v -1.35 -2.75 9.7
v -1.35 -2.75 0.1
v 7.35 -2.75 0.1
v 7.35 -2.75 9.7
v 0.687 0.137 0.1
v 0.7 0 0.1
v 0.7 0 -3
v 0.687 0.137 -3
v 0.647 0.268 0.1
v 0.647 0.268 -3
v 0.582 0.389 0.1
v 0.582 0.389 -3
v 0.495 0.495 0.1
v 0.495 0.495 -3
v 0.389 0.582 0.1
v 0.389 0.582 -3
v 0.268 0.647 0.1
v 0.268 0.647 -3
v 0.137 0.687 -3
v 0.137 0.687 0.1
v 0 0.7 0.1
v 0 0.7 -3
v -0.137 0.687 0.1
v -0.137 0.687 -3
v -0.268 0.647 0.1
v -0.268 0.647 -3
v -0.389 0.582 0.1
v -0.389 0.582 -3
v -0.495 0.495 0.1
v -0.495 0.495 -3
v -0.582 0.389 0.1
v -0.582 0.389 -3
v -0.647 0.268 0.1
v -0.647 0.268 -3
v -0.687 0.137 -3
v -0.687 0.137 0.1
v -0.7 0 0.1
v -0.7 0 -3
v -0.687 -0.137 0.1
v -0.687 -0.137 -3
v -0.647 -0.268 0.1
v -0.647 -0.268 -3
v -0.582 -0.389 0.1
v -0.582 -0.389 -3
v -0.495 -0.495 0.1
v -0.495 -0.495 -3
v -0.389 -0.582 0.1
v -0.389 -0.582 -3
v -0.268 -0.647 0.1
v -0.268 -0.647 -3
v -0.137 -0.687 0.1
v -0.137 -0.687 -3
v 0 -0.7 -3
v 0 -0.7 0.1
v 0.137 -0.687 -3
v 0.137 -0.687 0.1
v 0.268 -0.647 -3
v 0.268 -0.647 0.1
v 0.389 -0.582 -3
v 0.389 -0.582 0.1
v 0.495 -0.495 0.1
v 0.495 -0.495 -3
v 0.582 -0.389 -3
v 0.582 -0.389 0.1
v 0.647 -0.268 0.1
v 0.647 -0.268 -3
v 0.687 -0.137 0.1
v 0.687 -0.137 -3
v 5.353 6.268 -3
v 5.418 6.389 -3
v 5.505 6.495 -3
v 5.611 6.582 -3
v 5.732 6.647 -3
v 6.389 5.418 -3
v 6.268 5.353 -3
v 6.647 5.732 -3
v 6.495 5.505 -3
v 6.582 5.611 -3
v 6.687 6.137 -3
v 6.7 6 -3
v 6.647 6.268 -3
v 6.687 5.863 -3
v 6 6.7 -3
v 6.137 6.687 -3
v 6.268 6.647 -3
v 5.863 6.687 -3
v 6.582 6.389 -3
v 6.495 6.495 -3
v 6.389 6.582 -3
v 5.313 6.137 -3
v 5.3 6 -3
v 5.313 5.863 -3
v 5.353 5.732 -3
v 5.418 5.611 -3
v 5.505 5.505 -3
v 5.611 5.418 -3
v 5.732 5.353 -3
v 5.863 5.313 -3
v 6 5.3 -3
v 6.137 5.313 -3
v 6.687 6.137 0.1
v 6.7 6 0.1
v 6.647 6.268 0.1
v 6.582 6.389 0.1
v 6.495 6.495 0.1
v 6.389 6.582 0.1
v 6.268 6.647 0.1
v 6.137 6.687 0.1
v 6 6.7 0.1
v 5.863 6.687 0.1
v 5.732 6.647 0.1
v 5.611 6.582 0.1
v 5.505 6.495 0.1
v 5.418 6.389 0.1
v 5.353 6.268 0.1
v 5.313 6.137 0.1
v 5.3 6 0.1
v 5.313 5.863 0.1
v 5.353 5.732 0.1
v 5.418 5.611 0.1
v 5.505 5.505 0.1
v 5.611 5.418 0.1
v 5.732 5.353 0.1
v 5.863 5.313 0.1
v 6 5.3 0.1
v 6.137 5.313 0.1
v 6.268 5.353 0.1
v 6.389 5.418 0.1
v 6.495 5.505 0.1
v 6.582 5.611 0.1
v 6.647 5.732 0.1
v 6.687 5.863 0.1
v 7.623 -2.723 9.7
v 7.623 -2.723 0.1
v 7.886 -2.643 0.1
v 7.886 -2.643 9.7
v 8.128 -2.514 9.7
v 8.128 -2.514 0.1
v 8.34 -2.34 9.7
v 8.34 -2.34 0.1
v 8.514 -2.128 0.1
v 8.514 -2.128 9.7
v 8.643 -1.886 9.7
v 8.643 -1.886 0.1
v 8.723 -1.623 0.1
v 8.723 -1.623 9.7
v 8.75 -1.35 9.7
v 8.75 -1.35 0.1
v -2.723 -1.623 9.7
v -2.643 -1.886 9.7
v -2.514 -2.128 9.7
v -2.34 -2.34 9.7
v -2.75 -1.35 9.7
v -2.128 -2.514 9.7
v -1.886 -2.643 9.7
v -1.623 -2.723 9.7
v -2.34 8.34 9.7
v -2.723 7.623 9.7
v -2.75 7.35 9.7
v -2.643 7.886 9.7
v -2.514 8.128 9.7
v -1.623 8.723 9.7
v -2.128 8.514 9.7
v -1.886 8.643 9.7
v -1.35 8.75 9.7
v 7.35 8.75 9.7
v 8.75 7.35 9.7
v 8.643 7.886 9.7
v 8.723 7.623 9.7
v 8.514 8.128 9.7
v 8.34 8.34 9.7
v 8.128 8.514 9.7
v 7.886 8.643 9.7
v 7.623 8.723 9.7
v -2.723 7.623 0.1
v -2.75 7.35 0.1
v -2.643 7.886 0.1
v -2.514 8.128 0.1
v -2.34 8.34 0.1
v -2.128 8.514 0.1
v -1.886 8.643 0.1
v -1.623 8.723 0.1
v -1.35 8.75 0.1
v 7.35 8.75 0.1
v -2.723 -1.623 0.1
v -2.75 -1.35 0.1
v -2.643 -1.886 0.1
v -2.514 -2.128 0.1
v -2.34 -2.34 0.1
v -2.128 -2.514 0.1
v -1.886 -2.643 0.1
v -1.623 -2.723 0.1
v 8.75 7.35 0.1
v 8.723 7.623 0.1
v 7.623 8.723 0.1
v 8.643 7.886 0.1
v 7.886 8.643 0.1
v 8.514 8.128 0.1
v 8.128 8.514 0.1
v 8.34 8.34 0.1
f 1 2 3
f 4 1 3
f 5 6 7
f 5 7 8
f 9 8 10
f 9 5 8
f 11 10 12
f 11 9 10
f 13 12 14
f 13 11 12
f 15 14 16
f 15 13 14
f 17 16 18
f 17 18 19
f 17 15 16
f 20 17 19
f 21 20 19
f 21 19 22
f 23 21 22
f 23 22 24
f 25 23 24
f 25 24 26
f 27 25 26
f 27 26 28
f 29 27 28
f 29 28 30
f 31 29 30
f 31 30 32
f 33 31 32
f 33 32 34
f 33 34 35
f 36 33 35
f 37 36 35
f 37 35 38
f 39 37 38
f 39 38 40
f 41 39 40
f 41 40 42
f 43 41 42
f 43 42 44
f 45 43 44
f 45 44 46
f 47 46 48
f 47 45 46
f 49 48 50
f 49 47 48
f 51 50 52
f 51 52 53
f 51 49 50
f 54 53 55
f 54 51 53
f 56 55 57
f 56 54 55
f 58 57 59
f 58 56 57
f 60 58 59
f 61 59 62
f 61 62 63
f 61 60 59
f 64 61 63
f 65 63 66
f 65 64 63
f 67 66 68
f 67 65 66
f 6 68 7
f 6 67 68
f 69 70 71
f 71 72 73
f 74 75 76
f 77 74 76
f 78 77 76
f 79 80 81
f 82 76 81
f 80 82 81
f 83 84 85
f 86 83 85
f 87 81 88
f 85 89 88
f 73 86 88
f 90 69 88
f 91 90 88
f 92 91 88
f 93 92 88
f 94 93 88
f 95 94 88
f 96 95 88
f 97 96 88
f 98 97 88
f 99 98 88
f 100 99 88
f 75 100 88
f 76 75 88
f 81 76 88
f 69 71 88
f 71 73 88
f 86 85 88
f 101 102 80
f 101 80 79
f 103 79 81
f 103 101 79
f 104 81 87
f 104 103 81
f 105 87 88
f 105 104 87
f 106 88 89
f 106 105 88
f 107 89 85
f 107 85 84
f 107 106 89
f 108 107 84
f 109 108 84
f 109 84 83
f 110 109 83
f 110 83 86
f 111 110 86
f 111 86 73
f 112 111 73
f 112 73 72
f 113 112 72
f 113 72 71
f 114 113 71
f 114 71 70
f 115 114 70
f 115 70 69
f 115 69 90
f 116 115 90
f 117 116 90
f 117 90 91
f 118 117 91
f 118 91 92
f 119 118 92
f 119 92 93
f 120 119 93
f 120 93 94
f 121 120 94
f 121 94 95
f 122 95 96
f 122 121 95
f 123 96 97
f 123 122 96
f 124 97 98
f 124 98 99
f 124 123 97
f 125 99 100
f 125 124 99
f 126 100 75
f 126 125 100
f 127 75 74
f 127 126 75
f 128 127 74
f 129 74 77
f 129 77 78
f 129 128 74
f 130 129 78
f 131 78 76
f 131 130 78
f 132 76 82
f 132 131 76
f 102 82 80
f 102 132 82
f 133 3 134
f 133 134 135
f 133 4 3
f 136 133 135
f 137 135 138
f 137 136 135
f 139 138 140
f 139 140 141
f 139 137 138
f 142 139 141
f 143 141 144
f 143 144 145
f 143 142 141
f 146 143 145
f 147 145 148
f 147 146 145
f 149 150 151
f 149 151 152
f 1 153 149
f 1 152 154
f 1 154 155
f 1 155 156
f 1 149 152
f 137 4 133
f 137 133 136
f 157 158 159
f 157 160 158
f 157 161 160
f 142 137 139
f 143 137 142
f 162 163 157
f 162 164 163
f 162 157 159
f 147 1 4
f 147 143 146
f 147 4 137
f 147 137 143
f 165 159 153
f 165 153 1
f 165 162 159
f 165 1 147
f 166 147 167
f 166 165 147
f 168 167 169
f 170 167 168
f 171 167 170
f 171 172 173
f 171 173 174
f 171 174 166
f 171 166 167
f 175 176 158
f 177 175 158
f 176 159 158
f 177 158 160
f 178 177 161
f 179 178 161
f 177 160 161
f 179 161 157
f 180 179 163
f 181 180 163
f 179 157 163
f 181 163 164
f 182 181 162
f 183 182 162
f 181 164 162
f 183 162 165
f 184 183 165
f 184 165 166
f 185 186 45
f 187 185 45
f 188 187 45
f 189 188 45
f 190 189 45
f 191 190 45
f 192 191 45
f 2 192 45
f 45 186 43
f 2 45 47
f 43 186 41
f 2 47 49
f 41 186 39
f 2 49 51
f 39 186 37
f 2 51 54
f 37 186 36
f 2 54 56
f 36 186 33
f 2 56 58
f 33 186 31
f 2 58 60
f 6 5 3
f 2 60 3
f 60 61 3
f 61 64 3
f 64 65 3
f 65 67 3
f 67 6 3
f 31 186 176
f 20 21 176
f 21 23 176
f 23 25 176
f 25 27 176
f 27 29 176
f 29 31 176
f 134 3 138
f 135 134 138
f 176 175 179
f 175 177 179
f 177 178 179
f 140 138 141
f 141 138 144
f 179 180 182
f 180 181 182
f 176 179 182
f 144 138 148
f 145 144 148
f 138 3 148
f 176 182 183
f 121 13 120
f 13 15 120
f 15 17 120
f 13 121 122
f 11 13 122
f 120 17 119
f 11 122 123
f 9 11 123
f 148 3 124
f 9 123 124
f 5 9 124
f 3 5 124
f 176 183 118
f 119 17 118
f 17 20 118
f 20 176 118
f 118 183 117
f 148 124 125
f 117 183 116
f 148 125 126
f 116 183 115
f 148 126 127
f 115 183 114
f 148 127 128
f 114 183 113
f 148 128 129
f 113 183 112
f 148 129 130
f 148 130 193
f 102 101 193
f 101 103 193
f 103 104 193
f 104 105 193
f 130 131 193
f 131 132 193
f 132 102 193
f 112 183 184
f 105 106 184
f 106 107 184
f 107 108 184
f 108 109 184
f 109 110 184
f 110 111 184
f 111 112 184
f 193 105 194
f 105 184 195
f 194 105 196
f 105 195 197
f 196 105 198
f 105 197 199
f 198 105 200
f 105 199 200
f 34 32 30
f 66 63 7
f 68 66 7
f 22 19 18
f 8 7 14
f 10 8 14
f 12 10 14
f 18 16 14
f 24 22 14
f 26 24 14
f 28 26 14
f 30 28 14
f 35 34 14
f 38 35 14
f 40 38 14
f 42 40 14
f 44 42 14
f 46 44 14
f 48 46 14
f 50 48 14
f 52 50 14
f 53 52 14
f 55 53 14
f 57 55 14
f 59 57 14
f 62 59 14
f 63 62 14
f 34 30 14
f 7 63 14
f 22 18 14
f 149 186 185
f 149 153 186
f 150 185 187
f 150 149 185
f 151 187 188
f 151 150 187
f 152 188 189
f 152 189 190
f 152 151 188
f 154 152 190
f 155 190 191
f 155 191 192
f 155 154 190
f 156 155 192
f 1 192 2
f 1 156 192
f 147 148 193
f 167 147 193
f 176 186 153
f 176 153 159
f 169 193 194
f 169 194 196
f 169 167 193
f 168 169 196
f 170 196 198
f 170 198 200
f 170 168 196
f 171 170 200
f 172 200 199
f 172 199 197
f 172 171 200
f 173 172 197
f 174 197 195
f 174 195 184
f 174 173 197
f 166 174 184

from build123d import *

# Parameters (mm, degrees)
SKETCH_W     = 11.5
SKETCH_H     = 11.5
PAD_DEPTH    = 9.6
FILLET_R     = 1.4
SKETCH001_R  = 0.7
PAD001_DEPTH = 3.5


with BuildPart() as fillet_body:
    # Sketch → Pad (new body)
    with BuildSketch(Plane.XY.offset(0.1)):
        with Locations((3, 3)):
            Rectangle(SKETCH_W, SKETCH_H)
    extrude(amount=PAD_DEPTH)

    # Fillet
    fillet_edges = [fillet_body.edges().sort_by_distance(p)[0] for p in [
        (8.75, -2.75, 4.9),
        (8.75, 8.75, 4.9),
        (-2.75, -2.75, 4.9),
        (-2.75, 8.75, 4.9),
    ]]
    fillet(fillet_edges, radius=FILLET_R)


with BuildPart() as pad001_mp_cp:
    # Sketch001 → Pad001 (new body)
    with BuildSketch(Plane.XY.offset(0.5)):
        Circle(SKETCH001_R)
        with Locations((6, 6)):
            Circle(SKETCH001_R)
    extrude(amount=-PAD001_DEPTH)

    # Pad001_mp_cp: union Fillet body
    add(fillet_body.part)


solid = pad001_mp_cp.part
